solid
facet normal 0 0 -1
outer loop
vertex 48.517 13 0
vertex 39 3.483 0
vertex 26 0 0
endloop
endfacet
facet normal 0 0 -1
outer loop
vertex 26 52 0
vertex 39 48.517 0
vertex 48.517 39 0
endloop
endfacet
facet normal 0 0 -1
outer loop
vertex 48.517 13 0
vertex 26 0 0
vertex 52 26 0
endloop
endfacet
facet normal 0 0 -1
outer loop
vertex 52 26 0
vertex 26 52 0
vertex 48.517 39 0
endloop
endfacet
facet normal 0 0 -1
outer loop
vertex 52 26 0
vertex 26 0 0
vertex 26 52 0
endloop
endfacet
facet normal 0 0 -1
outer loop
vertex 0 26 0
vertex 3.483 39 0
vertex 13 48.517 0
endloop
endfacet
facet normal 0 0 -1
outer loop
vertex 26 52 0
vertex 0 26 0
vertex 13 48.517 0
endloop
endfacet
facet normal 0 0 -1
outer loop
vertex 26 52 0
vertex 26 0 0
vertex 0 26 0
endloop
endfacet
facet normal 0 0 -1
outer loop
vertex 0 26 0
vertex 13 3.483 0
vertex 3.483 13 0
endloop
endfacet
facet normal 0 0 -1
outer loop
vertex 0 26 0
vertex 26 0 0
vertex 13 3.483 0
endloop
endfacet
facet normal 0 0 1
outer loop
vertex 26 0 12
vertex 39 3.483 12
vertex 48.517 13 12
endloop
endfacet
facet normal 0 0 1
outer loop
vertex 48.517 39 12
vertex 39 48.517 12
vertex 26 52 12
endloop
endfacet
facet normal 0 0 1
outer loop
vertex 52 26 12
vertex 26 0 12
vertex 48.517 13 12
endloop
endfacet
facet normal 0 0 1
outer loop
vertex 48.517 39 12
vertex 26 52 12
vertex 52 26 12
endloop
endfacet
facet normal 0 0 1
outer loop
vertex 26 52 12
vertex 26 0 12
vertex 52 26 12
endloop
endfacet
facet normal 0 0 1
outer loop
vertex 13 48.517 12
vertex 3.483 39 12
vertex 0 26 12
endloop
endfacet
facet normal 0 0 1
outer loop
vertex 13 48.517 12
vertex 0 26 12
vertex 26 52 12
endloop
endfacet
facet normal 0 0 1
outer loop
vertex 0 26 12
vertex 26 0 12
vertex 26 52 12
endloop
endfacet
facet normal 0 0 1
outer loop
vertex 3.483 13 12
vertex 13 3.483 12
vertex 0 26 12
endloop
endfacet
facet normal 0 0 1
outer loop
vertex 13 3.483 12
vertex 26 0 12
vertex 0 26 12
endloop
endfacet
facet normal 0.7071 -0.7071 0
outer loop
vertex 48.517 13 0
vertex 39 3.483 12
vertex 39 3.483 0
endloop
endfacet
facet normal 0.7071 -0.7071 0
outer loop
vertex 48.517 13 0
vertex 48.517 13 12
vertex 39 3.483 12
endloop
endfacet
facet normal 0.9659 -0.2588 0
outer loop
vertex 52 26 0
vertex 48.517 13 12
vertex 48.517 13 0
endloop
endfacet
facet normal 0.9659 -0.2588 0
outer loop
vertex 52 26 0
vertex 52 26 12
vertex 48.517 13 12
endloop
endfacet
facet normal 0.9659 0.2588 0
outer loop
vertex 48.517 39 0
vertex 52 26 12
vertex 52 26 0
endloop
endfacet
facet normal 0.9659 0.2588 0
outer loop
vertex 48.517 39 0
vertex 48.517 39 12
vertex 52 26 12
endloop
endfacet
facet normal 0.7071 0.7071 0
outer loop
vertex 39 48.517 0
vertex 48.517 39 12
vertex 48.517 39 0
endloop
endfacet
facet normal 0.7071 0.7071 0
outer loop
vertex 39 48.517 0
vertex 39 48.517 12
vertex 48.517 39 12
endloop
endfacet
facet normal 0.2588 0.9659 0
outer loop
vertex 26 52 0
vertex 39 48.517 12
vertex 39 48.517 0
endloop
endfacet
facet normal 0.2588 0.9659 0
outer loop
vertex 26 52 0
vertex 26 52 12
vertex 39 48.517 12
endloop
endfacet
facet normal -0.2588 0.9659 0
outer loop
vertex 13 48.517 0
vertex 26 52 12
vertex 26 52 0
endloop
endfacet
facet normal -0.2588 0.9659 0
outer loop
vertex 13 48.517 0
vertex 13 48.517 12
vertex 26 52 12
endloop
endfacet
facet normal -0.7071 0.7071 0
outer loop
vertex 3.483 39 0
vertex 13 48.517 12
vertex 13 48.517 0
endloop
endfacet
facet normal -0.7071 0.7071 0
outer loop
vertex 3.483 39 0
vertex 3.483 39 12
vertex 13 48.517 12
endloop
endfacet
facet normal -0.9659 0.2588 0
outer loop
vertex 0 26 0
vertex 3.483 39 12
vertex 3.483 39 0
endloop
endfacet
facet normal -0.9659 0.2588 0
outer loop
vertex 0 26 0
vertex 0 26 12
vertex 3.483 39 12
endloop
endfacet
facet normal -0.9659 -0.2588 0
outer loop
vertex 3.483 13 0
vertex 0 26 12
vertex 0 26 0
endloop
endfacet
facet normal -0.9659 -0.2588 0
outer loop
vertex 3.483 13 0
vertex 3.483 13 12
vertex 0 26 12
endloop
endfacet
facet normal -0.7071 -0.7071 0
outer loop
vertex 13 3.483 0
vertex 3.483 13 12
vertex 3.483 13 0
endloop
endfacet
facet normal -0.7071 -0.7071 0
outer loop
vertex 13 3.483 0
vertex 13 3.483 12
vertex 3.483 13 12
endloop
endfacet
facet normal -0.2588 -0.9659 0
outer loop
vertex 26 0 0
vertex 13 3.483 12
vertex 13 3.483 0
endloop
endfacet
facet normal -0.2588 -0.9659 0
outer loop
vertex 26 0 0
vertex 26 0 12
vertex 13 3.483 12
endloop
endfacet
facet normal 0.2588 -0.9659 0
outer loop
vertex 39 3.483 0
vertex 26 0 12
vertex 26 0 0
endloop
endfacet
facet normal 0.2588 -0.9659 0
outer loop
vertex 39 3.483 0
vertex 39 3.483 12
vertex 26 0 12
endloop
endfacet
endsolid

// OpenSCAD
$fn = 32;

// ----------------------------------------------------------------------
// Flat adaptor: keyed, 12 mm thick
// ----------------------------------------------------------------------

// --- parameters (mm) ---
profile_height = 12;      // extrusion height
profile_points = 12;      // points of the closed outline

profile = [[0, 26], [3.483, 13], [13, 3.483], [26, 0], [39, 3.483], [48.517, 13], [52, 26], [48.517, 39], [39, 48.517], [26, 52], [13, 48.517], [3.483, 39]];  // single closed polygon, 12 points, counter clockwise

// --- the one profile operation ---
linear_extrude(height = profile_height) polygon(points = profile);
